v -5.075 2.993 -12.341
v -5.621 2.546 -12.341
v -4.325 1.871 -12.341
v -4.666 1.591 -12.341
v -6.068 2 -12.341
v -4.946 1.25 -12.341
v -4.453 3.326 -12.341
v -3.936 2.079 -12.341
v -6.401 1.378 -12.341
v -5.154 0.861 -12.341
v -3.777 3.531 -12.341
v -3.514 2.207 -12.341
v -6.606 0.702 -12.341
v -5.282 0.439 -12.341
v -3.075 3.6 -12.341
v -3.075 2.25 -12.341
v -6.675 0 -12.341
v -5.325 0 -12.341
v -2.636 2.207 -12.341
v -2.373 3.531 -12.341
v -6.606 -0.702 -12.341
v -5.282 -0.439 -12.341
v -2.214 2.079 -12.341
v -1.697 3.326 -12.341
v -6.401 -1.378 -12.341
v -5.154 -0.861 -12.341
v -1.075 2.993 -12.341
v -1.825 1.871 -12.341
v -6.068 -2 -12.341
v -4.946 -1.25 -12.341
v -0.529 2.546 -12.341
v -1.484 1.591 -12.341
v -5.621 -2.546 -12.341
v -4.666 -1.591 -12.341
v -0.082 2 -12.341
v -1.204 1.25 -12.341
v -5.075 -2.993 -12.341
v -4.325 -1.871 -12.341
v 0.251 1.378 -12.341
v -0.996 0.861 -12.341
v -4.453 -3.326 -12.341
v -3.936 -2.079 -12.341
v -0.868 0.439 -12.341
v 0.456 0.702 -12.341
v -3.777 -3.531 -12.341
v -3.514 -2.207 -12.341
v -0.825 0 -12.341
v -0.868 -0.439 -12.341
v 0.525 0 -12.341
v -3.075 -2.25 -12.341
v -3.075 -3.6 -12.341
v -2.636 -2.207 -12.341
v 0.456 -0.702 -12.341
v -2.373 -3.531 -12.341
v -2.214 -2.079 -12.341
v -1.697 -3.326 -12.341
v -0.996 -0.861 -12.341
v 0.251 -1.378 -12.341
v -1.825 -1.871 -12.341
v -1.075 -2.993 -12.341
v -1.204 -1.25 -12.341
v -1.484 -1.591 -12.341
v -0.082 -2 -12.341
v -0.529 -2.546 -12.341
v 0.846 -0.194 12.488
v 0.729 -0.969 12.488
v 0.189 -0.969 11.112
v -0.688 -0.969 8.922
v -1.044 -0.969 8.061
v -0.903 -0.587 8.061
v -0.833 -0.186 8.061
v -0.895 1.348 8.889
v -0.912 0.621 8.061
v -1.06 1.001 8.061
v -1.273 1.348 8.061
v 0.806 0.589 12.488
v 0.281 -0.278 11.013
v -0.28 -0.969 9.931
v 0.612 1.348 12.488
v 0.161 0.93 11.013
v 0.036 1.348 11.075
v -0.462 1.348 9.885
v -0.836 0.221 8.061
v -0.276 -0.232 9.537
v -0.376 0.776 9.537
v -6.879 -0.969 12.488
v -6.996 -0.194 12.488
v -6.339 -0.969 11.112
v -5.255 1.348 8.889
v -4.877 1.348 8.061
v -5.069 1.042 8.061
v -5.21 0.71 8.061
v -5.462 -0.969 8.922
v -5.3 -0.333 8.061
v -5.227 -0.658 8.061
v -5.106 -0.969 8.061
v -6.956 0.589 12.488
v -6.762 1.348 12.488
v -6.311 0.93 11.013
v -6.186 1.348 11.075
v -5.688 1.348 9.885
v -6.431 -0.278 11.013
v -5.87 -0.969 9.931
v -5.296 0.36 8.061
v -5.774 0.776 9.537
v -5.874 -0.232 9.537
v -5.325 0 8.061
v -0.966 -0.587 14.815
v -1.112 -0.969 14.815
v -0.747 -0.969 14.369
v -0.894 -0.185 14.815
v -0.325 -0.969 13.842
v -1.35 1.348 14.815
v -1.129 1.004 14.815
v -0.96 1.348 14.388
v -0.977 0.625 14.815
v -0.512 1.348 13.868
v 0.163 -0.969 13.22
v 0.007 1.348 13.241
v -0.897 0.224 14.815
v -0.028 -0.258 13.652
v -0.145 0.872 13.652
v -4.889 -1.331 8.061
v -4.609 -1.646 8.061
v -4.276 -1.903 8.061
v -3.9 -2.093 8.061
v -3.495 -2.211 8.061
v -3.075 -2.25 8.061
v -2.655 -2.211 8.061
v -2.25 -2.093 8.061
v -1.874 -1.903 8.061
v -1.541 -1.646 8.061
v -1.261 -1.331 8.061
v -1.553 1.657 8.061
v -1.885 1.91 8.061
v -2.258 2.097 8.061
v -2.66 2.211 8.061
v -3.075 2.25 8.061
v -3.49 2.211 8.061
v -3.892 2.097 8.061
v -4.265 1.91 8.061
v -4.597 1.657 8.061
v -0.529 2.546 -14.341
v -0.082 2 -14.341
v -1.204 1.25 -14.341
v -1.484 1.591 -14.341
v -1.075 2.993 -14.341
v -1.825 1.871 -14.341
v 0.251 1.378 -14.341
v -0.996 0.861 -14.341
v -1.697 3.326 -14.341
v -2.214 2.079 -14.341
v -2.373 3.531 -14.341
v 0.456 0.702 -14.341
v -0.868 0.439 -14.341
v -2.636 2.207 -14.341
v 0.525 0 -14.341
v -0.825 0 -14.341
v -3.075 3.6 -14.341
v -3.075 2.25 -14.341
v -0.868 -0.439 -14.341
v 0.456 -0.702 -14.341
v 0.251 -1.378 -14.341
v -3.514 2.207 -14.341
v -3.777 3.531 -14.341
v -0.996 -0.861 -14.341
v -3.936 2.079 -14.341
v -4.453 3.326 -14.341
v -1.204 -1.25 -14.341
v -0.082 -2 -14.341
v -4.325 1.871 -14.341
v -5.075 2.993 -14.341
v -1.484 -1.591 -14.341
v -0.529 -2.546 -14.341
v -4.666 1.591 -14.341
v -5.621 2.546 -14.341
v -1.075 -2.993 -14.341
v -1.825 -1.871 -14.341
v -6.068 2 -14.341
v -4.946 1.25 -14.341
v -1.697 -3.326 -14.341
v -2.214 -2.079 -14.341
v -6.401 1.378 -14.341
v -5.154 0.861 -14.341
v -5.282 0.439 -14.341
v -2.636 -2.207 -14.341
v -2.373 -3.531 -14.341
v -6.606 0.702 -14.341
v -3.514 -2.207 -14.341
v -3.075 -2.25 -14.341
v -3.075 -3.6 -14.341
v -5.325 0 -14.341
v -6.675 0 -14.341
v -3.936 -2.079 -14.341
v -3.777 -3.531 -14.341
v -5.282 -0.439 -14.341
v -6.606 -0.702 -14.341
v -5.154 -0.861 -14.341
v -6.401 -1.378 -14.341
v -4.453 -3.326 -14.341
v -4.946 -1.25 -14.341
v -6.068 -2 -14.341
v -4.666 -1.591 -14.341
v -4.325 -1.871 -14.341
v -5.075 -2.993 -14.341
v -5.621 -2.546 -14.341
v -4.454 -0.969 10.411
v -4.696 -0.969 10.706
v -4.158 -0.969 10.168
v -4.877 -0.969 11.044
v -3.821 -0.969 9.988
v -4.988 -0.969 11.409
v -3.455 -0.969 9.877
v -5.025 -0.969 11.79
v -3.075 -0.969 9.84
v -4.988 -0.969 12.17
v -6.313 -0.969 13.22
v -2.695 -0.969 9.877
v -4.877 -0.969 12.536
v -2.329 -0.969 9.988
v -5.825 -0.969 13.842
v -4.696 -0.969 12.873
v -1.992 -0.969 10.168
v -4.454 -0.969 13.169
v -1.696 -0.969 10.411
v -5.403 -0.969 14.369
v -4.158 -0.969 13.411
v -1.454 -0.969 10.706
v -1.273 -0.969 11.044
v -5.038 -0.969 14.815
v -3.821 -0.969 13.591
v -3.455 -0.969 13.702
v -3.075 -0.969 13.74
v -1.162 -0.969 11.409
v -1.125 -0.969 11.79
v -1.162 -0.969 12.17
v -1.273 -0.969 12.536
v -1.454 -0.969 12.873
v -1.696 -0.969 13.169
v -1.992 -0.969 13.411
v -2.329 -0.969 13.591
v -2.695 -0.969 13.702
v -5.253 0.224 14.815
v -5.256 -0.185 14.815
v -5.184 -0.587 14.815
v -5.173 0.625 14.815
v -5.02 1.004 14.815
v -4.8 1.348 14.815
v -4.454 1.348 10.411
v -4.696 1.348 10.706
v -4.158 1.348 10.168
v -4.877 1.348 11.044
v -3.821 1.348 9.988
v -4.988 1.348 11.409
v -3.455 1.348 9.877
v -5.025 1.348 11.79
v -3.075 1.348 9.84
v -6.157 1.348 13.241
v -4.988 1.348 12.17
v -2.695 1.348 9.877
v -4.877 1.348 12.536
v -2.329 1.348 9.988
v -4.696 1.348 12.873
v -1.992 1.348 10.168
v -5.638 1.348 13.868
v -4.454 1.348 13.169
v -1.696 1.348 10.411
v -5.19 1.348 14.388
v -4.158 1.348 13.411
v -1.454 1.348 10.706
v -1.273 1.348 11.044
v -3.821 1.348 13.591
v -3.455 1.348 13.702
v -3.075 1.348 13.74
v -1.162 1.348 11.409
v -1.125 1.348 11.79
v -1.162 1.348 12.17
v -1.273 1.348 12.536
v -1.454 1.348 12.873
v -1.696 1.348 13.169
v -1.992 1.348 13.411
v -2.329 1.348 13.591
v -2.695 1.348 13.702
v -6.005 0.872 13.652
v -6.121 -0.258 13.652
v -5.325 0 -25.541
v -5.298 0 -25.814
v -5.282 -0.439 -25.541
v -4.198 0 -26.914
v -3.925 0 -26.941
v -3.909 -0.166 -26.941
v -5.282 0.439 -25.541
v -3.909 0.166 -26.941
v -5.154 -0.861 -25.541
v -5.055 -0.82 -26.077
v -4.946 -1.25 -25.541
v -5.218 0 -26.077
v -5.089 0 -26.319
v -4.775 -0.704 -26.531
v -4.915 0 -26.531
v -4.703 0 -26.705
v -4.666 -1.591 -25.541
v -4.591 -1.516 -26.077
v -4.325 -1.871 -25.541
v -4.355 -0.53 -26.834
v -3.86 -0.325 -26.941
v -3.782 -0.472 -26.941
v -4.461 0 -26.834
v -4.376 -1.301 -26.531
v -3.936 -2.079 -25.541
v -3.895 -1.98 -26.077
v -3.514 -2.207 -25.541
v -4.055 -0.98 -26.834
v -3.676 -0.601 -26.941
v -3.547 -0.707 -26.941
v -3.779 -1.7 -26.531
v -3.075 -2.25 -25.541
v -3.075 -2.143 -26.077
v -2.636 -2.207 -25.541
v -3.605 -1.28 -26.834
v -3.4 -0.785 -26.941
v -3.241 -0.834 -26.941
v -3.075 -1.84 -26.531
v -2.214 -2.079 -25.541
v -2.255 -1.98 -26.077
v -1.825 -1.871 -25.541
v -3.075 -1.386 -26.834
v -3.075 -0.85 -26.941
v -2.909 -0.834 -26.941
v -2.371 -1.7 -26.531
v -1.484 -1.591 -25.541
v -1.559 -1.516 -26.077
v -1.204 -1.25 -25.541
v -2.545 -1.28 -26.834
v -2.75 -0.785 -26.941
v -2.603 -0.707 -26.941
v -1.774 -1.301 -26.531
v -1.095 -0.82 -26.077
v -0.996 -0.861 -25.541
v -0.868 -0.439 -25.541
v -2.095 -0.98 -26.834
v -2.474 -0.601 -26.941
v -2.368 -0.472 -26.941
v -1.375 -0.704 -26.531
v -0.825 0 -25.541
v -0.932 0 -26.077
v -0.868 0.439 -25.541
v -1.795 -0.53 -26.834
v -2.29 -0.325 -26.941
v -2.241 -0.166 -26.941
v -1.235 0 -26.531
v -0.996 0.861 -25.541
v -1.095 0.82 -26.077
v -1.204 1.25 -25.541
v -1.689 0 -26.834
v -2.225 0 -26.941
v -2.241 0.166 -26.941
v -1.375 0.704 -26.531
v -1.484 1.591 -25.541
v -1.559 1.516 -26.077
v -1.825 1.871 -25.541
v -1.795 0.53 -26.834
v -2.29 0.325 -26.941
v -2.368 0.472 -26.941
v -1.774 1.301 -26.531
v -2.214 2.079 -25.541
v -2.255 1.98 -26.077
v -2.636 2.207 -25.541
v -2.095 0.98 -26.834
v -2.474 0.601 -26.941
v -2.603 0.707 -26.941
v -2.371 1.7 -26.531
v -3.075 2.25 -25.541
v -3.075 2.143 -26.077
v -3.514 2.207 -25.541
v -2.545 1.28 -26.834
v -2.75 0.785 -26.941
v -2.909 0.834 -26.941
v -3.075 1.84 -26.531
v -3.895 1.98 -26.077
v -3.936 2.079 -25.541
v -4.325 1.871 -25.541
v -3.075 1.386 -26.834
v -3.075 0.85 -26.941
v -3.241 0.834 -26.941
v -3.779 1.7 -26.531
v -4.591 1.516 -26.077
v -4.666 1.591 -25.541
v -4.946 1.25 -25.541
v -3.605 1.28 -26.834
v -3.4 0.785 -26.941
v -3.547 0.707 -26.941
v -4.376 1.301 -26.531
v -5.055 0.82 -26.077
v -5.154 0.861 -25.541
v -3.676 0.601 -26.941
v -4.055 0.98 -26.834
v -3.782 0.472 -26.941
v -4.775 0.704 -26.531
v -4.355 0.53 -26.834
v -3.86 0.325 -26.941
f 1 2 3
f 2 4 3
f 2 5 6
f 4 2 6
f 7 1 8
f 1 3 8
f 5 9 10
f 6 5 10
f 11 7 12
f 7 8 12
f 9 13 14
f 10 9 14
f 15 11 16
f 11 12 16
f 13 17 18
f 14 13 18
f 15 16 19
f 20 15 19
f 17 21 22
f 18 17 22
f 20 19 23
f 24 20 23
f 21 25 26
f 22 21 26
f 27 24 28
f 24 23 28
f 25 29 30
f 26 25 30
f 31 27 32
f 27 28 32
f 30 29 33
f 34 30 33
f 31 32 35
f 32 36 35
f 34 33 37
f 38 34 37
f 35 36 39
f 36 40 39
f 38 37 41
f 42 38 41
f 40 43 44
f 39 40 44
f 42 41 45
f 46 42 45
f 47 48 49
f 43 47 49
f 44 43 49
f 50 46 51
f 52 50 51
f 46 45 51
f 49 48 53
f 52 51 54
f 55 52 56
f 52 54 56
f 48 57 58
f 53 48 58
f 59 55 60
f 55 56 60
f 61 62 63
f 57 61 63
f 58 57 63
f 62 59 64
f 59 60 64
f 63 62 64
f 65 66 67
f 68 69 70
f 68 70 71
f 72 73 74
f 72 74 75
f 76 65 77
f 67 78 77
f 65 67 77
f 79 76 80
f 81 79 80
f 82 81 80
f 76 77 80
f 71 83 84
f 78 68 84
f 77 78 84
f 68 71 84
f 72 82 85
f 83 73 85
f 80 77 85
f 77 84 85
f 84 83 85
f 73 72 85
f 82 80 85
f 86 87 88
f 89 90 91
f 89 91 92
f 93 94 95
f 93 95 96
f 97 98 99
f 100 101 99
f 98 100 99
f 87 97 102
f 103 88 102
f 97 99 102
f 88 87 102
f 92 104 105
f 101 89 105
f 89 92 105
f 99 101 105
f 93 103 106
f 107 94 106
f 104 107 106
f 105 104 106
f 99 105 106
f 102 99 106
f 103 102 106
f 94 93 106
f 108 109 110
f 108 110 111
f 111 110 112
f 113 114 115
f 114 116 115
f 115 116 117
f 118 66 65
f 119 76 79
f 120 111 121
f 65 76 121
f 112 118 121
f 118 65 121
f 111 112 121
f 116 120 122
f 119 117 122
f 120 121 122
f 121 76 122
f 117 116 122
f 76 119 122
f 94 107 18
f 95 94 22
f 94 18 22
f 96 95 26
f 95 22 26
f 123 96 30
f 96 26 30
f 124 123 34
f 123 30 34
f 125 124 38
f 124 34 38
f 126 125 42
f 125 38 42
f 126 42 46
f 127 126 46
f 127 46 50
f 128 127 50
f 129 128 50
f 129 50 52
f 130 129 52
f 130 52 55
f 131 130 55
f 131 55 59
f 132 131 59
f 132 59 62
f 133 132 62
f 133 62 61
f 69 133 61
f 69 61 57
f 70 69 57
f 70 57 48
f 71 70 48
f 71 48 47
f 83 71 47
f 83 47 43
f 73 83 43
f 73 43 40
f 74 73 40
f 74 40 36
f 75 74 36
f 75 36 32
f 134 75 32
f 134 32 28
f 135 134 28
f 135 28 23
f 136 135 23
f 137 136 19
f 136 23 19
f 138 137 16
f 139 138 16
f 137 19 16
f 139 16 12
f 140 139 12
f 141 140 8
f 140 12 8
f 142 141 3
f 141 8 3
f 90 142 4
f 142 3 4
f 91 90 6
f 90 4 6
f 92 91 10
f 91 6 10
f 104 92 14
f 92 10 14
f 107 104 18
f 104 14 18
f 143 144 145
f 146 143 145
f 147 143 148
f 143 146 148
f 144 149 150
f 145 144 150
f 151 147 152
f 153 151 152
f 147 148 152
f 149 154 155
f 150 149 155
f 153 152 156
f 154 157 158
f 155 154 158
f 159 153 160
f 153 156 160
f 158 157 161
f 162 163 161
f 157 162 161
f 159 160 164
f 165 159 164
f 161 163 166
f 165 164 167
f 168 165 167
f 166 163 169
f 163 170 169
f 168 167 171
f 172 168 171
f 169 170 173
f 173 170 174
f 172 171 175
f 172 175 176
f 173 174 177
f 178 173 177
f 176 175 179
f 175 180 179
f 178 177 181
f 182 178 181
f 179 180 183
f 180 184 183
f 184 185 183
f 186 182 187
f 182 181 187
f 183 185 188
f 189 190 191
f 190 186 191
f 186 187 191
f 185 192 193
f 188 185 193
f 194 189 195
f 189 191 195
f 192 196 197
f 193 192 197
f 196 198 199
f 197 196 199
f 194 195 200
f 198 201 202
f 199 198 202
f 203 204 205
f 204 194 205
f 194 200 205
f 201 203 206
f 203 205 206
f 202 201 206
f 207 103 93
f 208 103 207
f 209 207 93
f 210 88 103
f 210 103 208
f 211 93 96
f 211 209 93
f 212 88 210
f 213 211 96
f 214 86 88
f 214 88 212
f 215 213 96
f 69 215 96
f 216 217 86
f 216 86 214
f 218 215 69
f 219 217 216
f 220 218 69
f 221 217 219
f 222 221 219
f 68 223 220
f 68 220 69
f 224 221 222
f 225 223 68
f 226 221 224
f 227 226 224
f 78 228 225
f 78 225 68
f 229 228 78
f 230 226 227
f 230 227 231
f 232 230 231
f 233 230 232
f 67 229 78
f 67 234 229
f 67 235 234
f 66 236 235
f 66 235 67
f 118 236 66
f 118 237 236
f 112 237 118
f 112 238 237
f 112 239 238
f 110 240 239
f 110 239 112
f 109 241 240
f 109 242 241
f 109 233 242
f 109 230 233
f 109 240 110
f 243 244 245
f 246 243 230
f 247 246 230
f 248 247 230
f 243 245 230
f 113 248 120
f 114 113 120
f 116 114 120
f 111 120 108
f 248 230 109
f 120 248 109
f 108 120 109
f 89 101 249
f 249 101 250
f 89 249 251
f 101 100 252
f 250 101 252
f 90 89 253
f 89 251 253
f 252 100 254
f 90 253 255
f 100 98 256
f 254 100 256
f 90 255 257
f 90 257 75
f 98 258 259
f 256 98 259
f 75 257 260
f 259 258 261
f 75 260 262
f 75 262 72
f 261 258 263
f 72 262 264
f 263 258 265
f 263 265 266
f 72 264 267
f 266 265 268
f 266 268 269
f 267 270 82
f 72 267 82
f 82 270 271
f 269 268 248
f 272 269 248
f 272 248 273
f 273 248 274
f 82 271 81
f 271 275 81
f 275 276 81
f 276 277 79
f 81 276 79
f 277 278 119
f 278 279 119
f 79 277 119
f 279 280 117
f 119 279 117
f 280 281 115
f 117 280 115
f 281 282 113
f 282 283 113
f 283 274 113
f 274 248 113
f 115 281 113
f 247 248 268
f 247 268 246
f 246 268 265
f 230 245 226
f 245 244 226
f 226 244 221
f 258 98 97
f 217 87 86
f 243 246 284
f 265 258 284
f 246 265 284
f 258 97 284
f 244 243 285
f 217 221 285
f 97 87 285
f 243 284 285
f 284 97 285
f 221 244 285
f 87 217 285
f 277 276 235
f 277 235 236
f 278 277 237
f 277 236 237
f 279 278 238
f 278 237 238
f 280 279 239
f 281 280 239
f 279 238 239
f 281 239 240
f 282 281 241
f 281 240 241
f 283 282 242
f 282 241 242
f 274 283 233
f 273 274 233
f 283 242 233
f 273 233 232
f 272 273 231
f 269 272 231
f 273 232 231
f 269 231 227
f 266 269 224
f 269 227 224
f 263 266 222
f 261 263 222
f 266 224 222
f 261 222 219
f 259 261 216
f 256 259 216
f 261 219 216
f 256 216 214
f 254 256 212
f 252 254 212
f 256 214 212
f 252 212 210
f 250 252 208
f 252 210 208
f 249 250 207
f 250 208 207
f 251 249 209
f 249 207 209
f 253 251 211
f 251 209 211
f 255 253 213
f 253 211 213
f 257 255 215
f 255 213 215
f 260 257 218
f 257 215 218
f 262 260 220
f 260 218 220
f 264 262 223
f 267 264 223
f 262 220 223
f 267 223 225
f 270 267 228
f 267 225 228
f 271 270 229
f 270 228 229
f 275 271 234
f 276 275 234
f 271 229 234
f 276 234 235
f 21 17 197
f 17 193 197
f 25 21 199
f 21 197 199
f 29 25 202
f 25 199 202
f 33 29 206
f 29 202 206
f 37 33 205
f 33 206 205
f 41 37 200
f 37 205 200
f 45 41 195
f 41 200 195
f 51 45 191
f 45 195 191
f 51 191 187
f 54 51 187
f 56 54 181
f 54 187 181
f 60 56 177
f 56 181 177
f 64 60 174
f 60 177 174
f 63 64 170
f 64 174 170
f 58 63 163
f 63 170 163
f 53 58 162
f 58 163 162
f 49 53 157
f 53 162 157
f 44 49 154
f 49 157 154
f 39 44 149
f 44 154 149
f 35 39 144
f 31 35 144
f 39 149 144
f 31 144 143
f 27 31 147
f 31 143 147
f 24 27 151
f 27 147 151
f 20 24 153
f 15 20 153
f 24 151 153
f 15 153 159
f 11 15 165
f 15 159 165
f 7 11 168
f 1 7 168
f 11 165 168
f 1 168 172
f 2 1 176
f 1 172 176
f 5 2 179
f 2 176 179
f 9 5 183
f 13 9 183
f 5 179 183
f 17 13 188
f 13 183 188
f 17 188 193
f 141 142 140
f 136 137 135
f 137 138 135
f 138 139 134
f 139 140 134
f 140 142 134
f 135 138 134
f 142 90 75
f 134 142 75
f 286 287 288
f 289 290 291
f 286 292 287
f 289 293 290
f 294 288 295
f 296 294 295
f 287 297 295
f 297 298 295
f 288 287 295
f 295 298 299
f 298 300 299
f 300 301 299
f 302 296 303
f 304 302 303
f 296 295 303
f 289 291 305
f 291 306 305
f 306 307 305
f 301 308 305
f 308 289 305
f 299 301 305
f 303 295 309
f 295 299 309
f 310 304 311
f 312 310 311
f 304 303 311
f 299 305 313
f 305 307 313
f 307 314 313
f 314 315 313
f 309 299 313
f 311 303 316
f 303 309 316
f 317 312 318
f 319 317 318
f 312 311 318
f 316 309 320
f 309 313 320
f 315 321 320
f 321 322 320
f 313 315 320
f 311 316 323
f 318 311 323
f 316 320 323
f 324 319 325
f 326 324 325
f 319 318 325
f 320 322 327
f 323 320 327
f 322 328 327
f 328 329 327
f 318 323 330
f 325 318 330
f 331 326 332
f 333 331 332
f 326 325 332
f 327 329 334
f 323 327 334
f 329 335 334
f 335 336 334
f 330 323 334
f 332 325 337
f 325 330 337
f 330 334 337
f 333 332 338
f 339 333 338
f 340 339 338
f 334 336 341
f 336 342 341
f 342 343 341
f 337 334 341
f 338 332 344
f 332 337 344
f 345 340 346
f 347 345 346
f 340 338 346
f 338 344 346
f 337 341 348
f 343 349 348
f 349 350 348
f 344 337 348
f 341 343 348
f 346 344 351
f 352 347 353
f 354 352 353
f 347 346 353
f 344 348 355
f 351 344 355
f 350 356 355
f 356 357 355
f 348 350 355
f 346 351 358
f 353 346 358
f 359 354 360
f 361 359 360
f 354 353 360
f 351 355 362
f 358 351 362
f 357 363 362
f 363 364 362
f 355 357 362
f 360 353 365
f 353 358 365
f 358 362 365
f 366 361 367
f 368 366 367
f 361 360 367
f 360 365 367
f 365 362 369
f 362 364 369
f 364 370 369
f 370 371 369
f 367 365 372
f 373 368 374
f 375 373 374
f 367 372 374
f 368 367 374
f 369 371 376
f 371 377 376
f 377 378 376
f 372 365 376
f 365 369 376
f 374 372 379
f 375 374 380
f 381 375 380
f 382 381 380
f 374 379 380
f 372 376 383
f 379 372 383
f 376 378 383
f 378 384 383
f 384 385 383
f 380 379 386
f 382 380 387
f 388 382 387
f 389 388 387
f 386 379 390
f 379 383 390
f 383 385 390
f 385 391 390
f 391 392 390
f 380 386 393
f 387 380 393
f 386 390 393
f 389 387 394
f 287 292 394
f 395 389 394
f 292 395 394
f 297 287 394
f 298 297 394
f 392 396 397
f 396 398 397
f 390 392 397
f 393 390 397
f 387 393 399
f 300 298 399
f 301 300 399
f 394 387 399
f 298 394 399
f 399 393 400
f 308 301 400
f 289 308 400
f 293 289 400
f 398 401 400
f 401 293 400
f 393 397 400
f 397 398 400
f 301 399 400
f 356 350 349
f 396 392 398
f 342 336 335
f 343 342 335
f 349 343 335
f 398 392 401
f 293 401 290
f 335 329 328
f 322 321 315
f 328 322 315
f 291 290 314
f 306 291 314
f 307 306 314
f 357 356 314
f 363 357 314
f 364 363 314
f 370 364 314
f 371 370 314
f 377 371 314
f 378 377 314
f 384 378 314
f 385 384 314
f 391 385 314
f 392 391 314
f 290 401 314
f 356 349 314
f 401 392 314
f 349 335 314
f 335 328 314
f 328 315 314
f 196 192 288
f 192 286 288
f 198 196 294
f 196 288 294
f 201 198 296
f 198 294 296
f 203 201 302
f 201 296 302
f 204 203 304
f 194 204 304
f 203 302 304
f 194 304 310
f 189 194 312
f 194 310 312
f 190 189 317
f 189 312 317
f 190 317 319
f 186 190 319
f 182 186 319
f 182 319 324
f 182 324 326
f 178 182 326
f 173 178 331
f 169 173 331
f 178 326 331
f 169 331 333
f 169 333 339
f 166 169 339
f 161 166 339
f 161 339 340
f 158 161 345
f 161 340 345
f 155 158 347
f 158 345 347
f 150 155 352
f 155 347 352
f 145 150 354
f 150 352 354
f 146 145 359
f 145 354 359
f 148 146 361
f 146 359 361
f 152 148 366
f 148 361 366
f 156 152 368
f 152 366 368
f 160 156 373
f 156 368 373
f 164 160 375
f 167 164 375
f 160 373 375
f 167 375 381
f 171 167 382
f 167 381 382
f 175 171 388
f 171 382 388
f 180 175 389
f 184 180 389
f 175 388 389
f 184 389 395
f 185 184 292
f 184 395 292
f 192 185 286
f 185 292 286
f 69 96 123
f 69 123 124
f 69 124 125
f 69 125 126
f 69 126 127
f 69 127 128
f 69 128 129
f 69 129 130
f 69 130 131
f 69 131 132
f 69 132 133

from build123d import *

# Parameters (mm, degrees)
F3_START = -1.34776
F2_W     = 11.6723957472
F2_H     = 7.4633890763
F3_DEPTH = 23.65224
F5_START = 0.96875
F4_W     = 10.800289805
F4_H     = 7.1797380224
F5_DEPTH = 7.09642
F6_R     = 1.95
F7_DEPTH = 12.5


with BuildPart() as f1:
    # F0 (on Front) → F1 (revolve)
    with BuildSketch(Plane.XZ):
        with BuildLine():
            Line((-7.0006786053, 12.4883897992), (-5.3249788856, 8.0614940048))
            Line((-5.3249788856, 8.0614940048), (-5.3249788856, -12.3409103399))
            Line((-5.3249788856, -12.3409103399), (-6.6749788856, -12.3409103399))
            Line((-6.6749788856, -12.3409103399), (-6.6749788856, -14.3409103399))
            Line((-6.6749788856, -14.3409103399), (-5.3249788856, -14.3409103399))
            Line((-5.3249788856, -14.3409103399), (-5.3249788856, -25.5409103399))
            ThreePointArc((-5.3249788856, -25.5409103399), (-4.9149283792, -26.5308598336), (-3.9249788856, -26.9409103399))
            Line((-3.9249788856, -26.9409103399), (-3.0749788856, -26.9409103399))
            Line((-3.0749788856, -26.9409103399), (-3.0749788856, 10.274941902))
            ThreePointArc((-3.0749788856, 10.274941902), (-4.5898110963, 11.7897741127), (-3.0749788856, 13.3046063234))
            Line((-3.0749788856, 13.3046063234), (-3.0749788856, 14.8147279002))
            Line((-3.0749788856, 14.8147279002), (-5.2641126534, 14.8147279002))
            Line((-5.2641126534, 14.8147279002), (-7.0006786053, 12.4883897992))
        make_face()
    revolve(axis=Axis((-3.0749788856, 0, -4.5506457565), (0, 0, 1)))

    # F2 (on Front) → F3 (cut)
    with BuildSketch(Plane.XZ.offset(F3_START)):
        with Locations((-2.7008608449, 11.793188543)):
            Rectangle(F2_W, F2_H)
    extrude(amount=-F3_DEPTH, mode=Mode.SUBTRACT)

    # F4 (on Front) → F5 (cut)
    with BuildSketch(Plane.XZ.offset(F5_START)):
        with Locations((-3.5045757541, 11.651363016)):
            Rectangle(F4_W, F4_H)
    extrude(amount=F5_DEPTH, mode=Mode.SUBTRACT)

    # F6 (on face) → F7 (cut, symmetric)
    with BuildSketch(Plane.XZ.offset(0.96875)):
        with Locations((-3.0749788856, 11.7897741127)):
            Circle(F6_R)
    extrude(amount=F7_DEPTH, both=True, mode=Mode.SUBTRACT)


solid = f1.part
